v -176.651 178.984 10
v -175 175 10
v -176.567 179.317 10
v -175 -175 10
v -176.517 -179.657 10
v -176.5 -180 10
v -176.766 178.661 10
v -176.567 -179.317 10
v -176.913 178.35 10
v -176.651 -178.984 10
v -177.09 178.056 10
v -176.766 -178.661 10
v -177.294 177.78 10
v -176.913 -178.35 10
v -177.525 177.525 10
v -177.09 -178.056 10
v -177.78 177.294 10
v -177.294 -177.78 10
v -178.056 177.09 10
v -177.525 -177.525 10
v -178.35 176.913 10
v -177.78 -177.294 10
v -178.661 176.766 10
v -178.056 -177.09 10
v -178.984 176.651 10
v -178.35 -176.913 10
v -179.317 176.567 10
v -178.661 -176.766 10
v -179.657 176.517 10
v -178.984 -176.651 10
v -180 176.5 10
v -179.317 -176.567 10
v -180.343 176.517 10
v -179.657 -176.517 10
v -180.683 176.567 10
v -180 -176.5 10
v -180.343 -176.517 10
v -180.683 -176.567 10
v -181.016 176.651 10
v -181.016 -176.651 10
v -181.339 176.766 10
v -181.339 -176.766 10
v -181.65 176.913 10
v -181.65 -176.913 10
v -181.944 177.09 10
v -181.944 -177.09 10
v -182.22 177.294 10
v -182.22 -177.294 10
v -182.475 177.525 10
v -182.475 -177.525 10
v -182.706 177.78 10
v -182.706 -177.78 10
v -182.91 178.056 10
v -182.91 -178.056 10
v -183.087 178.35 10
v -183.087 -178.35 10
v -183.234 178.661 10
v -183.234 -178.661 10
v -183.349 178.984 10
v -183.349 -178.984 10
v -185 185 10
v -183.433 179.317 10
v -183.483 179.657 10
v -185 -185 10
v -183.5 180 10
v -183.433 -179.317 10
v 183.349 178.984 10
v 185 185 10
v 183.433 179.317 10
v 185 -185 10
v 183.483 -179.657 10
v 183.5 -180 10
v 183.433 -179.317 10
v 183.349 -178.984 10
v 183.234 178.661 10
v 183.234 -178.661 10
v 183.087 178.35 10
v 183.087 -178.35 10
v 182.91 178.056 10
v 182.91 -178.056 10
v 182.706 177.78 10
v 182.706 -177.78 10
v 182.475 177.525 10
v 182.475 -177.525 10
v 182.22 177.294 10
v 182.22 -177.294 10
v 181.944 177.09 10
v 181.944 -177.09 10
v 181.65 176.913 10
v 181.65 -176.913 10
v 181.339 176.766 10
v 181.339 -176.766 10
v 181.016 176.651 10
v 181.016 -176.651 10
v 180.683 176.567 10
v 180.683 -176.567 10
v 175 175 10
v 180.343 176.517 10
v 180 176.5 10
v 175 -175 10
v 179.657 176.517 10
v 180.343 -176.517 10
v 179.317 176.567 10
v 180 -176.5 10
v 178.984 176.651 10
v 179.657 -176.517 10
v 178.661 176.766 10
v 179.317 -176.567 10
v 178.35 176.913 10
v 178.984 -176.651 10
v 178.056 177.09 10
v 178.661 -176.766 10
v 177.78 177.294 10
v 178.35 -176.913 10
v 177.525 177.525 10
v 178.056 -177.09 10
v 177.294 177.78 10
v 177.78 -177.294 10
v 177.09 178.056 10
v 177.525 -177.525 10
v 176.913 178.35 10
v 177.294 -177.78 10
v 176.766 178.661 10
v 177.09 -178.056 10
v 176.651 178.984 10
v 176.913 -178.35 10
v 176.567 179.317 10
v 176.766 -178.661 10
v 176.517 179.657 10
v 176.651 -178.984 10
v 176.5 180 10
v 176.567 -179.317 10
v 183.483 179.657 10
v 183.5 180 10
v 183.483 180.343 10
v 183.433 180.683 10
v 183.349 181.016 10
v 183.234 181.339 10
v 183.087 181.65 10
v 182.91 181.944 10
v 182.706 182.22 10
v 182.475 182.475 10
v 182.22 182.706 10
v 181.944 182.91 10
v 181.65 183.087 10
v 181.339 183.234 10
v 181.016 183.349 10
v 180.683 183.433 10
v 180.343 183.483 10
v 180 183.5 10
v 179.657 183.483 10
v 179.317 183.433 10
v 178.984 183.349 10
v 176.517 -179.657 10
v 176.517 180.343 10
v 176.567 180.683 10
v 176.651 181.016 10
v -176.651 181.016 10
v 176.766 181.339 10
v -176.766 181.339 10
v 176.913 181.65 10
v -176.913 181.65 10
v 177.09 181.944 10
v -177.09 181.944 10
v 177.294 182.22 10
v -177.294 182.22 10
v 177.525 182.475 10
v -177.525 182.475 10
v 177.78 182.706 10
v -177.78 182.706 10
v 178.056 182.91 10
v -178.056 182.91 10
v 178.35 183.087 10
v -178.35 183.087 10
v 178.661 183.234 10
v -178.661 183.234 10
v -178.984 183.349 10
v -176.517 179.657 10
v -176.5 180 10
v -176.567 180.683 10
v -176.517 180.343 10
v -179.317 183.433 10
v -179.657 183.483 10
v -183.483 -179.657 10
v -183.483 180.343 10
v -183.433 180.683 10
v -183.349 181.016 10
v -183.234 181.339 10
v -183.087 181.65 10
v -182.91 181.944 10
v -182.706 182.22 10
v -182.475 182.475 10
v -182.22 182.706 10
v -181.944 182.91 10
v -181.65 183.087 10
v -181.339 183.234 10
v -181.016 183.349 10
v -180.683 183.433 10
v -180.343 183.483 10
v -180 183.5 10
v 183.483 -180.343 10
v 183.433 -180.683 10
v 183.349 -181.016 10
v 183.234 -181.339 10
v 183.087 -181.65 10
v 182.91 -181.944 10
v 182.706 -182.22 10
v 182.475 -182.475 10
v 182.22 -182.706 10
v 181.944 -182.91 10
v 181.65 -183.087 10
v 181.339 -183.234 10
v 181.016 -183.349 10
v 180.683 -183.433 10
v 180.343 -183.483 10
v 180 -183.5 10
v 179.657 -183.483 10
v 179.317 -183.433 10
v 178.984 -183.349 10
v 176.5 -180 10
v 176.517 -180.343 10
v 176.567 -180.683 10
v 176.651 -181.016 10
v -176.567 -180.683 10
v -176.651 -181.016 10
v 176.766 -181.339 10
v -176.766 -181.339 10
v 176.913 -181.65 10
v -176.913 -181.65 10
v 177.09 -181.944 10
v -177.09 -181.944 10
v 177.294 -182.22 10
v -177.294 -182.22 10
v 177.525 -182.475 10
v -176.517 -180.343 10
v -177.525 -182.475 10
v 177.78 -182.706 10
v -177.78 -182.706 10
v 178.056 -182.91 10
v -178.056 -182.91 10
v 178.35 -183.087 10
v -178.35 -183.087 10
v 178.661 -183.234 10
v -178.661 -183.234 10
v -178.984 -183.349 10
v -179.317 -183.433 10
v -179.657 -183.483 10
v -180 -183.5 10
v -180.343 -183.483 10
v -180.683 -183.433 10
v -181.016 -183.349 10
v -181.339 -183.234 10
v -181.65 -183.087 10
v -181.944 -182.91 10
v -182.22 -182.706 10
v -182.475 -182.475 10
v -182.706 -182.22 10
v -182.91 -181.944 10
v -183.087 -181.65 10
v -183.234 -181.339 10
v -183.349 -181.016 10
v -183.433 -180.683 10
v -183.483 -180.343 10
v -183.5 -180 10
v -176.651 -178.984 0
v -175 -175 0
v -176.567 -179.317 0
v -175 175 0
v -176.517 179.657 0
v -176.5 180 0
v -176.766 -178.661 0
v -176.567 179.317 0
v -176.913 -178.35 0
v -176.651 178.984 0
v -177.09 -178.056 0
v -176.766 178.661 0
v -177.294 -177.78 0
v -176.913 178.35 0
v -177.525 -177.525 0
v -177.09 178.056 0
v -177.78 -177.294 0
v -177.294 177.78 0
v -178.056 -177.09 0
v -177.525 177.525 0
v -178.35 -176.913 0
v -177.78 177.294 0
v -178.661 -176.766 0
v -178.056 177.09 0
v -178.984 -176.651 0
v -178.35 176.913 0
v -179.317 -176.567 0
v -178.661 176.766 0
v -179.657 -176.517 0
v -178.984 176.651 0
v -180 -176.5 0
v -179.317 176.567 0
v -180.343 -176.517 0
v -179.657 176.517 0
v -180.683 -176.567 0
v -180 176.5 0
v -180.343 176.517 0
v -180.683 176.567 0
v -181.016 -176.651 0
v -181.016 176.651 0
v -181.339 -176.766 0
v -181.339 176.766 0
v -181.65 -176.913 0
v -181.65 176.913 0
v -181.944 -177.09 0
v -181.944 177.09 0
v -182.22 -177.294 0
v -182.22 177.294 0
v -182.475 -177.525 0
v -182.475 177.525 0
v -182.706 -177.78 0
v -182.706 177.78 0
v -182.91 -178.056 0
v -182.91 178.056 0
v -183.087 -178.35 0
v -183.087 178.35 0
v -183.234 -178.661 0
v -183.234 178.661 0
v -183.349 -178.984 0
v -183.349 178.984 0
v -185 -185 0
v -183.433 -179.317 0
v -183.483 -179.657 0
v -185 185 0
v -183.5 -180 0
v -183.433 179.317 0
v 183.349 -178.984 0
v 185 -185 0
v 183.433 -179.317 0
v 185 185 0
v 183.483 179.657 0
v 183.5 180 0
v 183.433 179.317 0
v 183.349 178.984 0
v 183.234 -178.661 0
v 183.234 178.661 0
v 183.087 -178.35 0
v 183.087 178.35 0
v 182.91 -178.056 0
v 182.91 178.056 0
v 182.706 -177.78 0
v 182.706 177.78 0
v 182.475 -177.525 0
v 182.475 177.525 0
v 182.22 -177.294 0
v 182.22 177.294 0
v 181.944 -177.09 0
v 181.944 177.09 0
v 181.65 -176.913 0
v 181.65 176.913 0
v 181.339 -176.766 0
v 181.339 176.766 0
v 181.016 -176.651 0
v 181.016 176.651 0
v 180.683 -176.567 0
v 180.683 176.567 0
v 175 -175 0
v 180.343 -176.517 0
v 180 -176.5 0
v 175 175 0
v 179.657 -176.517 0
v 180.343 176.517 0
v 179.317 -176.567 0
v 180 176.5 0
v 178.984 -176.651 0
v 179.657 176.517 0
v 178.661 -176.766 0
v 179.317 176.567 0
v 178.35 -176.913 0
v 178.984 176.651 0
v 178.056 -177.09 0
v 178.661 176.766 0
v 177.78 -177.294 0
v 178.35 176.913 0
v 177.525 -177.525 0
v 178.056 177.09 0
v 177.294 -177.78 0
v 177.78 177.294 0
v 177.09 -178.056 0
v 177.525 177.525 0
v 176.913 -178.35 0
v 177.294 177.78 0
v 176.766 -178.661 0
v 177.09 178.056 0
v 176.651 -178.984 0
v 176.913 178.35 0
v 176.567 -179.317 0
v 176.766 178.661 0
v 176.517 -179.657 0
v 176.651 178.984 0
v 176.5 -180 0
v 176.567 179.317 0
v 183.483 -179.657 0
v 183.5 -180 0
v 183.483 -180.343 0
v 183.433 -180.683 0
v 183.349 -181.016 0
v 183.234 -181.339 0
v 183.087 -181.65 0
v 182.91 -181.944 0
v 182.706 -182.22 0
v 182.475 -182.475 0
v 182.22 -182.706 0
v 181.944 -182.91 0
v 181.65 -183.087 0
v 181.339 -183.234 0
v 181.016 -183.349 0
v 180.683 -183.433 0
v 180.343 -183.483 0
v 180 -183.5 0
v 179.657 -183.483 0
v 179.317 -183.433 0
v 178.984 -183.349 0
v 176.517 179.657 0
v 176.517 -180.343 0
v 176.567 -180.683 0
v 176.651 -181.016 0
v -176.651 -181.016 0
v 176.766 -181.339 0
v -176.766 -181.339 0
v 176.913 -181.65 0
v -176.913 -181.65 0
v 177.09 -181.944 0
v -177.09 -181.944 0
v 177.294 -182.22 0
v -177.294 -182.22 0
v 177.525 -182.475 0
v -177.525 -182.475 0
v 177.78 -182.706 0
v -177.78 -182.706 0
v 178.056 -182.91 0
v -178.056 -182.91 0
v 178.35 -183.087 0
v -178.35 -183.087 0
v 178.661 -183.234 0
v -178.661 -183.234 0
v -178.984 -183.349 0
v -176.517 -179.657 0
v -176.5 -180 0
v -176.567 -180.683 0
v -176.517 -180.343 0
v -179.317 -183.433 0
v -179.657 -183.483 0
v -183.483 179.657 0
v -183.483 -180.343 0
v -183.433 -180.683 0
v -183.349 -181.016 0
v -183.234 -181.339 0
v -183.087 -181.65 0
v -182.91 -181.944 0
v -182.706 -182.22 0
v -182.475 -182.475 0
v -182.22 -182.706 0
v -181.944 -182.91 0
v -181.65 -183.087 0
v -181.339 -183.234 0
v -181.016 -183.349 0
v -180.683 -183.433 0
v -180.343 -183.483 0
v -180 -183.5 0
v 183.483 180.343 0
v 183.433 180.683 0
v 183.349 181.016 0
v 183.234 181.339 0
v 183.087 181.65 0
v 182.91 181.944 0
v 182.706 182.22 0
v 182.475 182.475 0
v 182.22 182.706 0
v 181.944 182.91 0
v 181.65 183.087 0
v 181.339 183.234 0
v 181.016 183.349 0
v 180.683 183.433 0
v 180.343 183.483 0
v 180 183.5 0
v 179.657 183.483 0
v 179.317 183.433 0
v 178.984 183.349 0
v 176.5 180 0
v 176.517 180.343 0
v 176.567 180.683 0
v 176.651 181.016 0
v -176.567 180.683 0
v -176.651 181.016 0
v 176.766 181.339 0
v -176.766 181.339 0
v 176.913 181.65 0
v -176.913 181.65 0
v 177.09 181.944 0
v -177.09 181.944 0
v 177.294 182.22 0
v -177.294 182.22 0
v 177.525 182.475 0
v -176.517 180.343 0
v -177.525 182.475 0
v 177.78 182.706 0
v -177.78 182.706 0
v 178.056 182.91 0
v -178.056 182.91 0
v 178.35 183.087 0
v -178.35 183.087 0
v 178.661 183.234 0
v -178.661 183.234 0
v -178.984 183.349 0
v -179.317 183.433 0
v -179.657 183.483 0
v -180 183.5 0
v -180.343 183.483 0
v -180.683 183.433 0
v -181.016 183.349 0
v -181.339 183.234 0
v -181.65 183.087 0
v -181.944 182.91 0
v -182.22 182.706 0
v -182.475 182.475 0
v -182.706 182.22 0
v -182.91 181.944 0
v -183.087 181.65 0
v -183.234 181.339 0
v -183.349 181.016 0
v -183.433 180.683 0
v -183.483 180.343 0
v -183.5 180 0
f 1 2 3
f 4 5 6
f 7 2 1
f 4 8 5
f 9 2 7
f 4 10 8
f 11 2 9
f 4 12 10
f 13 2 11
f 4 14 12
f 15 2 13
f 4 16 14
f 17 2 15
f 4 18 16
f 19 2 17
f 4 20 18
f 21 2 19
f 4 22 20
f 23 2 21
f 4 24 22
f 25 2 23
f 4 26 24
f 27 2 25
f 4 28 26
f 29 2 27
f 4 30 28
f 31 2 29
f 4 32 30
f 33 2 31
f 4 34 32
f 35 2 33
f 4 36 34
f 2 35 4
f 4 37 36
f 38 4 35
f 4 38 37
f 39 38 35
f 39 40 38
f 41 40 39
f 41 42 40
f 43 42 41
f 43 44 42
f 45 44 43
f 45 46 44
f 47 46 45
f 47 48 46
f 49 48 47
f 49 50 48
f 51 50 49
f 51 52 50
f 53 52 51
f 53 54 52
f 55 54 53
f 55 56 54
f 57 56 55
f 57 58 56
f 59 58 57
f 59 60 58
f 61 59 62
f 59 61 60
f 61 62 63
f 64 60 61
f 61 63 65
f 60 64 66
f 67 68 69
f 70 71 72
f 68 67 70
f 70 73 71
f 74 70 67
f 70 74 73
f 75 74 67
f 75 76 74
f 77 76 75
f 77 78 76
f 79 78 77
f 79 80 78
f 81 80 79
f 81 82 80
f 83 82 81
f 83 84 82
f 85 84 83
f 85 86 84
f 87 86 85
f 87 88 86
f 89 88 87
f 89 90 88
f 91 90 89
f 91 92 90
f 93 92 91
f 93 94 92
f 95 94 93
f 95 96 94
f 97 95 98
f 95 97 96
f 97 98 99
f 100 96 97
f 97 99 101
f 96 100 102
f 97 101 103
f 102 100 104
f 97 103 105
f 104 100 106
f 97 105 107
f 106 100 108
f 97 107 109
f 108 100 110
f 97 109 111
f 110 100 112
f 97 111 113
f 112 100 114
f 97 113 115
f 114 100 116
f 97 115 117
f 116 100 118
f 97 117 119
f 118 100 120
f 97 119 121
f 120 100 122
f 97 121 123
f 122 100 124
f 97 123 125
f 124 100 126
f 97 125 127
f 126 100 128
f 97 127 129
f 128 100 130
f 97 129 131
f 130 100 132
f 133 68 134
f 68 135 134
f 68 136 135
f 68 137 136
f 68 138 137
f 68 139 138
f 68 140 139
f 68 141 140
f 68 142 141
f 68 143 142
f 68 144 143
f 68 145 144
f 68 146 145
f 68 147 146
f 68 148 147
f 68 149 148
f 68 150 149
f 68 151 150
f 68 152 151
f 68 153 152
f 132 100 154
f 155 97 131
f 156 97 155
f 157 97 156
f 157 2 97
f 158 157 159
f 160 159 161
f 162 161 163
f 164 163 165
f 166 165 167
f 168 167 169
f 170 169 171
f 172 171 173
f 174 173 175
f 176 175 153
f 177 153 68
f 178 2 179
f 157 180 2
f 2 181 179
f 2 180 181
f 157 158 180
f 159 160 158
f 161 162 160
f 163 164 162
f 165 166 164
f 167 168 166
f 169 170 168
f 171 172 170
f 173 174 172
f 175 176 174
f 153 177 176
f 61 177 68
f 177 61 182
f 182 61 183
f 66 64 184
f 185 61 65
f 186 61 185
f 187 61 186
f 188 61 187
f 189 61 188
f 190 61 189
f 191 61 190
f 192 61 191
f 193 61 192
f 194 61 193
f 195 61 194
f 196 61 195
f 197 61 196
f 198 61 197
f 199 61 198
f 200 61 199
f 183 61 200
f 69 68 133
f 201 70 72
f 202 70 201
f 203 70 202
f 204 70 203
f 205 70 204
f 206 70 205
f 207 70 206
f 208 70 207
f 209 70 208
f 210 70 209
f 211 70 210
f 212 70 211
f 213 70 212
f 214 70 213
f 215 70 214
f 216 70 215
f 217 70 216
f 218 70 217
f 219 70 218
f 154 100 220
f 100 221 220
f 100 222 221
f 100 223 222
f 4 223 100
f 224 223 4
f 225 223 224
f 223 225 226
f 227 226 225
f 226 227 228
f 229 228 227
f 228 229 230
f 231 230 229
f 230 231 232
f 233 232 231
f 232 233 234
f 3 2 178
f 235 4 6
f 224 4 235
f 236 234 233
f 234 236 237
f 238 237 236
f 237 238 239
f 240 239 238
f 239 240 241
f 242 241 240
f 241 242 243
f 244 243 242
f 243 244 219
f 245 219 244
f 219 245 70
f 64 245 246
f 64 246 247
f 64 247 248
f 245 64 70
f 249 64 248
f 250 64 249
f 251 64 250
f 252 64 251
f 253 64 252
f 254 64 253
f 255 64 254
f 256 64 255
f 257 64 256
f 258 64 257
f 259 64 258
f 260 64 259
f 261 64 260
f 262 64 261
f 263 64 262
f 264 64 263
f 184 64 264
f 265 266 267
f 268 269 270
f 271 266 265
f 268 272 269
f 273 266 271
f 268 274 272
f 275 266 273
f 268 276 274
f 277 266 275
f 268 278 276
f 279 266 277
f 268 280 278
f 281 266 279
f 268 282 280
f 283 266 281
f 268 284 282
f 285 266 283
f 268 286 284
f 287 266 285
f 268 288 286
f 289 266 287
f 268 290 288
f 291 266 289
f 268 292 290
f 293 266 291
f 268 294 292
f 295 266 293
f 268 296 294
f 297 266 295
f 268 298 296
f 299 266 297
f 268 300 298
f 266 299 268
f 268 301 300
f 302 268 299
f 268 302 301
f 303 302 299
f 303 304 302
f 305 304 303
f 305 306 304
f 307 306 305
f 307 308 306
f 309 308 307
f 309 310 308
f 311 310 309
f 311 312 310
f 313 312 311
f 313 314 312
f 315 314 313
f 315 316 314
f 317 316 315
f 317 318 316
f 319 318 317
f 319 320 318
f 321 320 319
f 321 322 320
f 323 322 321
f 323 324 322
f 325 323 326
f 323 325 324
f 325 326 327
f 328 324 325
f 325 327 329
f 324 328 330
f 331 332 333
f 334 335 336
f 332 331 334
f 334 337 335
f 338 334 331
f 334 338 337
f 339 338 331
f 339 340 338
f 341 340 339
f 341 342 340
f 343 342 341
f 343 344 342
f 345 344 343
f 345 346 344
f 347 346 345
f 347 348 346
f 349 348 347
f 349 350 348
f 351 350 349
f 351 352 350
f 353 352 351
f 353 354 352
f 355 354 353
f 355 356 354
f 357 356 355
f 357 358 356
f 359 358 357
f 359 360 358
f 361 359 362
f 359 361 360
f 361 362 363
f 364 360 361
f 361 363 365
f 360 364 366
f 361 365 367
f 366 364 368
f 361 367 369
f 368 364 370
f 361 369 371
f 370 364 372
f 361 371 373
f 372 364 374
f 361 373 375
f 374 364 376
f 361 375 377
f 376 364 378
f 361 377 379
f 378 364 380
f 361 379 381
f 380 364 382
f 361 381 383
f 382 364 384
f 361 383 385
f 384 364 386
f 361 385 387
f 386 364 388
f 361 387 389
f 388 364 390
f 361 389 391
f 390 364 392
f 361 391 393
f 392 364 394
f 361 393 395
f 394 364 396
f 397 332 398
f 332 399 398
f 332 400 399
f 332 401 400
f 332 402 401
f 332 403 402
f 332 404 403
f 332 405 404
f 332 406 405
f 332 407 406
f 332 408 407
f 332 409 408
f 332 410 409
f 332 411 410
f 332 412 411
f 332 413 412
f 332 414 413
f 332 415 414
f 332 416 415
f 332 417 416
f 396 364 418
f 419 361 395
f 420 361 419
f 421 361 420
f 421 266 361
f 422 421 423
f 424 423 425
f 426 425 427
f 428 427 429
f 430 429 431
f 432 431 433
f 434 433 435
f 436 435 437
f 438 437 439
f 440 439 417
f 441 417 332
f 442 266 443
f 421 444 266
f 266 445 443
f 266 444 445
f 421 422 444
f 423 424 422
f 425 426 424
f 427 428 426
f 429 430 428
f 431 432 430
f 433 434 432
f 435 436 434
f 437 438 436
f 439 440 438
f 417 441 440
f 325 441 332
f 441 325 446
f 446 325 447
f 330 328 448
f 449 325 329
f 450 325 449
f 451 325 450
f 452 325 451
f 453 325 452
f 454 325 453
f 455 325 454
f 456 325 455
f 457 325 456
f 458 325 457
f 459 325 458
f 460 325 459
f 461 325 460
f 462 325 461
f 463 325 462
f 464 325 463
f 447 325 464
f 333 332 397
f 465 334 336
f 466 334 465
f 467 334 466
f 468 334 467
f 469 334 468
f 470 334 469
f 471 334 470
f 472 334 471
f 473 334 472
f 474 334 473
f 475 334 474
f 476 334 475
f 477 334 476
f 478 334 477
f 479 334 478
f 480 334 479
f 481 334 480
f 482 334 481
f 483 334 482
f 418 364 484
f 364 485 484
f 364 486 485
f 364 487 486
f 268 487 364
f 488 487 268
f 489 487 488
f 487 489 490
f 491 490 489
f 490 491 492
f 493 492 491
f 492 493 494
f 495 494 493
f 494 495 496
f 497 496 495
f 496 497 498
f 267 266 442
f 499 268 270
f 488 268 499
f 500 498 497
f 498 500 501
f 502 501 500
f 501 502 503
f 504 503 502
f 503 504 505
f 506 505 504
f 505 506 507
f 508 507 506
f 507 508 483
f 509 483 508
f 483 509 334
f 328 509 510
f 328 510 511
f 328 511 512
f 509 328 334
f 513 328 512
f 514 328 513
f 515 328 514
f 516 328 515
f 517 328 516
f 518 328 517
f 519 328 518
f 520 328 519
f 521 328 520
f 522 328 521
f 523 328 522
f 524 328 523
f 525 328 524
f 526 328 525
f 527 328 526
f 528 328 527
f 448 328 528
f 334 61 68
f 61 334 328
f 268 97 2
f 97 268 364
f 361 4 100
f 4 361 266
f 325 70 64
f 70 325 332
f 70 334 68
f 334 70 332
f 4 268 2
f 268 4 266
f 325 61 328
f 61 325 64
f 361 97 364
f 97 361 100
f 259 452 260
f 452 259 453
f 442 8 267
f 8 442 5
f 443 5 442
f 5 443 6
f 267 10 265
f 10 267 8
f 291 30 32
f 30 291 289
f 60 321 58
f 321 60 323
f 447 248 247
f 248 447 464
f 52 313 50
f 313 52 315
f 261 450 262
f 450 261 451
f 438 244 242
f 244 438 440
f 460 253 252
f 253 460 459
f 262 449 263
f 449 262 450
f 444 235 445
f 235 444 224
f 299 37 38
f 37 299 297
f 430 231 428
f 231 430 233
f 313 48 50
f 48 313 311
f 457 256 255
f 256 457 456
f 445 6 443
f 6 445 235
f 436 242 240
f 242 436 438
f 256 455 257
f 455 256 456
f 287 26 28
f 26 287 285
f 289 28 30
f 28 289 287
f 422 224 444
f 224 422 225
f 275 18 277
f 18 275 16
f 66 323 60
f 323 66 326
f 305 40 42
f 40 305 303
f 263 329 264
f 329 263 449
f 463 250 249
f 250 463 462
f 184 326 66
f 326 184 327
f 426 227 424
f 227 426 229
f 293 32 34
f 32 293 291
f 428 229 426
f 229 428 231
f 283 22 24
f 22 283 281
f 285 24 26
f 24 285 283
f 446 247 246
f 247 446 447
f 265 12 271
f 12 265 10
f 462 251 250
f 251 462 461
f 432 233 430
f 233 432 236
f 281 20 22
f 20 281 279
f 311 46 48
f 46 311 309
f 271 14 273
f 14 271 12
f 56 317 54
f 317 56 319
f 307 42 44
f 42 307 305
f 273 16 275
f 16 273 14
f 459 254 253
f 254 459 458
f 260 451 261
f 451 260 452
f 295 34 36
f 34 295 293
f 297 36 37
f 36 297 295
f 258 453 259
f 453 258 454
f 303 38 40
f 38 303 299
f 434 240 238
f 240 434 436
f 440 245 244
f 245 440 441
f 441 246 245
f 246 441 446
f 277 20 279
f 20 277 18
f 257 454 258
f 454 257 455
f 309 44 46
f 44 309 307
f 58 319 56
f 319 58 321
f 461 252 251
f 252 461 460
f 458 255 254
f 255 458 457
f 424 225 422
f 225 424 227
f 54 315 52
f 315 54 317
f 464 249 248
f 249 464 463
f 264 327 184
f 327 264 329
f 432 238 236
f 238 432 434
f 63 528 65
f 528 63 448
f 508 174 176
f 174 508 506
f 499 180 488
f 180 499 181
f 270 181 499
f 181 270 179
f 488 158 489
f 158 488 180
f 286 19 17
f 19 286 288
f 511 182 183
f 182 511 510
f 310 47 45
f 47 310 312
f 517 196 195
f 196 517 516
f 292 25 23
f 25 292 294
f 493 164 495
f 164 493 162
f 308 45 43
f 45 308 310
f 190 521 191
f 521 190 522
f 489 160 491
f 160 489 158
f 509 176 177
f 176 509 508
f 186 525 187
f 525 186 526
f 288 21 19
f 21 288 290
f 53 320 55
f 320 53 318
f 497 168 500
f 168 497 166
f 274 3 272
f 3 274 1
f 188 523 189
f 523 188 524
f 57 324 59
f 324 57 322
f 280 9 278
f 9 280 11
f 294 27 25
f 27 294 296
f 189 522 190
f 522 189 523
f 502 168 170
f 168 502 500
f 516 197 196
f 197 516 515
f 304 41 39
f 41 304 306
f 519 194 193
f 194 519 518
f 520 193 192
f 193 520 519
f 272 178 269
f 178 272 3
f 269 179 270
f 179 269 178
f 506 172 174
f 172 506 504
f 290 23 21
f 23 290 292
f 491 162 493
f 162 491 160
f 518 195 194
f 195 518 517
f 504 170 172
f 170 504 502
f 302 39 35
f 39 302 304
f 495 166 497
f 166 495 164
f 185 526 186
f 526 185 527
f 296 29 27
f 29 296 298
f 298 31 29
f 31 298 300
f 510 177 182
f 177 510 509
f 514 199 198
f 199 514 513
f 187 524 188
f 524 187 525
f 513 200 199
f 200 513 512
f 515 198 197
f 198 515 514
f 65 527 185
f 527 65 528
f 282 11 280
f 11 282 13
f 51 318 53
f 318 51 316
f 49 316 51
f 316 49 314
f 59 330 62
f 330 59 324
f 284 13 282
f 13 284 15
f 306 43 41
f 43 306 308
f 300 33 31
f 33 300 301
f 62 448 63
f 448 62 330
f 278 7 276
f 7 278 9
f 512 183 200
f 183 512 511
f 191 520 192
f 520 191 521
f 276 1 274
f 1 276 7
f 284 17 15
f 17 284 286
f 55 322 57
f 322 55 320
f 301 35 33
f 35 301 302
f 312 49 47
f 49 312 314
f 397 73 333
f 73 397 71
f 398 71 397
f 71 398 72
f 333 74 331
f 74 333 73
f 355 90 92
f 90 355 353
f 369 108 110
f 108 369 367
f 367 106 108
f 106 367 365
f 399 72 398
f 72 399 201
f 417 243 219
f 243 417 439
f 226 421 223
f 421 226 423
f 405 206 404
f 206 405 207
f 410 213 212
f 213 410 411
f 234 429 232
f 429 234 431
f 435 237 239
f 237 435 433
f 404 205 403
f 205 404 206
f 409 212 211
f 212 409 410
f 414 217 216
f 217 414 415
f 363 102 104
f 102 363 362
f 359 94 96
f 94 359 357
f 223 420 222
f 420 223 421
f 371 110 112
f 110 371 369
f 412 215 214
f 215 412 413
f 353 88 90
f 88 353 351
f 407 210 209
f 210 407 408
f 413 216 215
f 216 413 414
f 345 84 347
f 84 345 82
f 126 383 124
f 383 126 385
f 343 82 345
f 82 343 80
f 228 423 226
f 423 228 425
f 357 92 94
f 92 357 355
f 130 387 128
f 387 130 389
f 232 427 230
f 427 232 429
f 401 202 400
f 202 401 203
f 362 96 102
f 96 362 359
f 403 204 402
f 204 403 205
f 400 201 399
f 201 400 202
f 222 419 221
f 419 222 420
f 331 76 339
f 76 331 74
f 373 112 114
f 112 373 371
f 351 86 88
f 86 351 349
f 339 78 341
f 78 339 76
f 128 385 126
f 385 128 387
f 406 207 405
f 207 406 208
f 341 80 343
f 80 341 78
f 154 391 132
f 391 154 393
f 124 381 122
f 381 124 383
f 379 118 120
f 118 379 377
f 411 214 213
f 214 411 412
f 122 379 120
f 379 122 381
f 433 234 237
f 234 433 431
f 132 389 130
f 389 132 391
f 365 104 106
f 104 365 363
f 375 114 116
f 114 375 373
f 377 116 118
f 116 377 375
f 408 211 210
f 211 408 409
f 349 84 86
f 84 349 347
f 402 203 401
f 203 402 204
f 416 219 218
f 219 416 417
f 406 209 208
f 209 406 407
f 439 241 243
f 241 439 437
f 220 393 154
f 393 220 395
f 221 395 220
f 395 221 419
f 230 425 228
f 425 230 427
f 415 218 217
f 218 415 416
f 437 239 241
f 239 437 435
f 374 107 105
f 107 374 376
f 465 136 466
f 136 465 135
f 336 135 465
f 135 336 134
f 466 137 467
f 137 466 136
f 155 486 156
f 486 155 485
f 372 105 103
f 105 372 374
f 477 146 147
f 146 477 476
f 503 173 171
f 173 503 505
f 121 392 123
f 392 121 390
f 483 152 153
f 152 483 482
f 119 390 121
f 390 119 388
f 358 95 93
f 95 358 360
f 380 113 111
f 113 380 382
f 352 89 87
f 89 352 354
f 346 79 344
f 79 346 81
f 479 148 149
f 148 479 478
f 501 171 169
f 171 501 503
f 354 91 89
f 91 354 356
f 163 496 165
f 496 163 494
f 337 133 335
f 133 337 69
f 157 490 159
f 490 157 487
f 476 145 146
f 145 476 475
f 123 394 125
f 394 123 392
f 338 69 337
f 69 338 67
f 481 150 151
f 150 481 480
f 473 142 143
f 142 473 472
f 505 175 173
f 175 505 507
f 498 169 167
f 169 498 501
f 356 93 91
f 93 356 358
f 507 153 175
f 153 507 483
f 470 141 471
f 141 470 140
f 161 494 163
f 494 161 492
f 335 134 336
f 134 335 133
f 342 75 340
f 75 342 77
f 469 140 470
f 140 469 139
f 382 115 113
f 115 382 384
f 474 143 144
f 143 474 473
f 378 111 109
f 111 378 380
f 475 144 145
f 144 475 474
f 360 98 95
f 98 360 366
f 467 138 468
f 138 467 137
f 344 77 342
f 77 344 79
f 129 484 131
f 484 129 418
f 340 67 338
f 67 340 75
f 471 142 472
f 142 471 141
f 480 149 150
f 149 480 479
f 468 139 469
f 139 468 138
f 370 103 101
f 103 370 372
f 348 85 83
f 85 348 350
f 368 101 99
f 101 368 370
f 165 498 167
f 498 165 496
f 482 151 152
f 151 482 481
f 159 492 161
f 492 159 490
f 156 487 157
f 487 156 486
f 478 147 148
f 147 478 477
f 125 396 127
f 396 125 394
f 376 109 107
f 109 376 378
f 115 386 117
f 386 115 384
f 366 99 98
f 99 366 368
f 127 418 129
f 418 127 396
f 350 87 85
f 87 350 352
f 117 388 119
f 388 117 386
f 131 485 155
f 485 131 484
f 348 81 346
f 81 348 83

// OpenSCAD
// ring_71.scad - ring index 71 (z bottom = 710 mm) (topmost)
$fn = 64; bar = 10; half_b = bar/2; outer = 370; half_outer = outer/2;
front_y = 180; back_y = -180; left_x = -180; right_x = 180;
x_centers = [-170, -100, -30, 40, 110, 180];
z_centers = [5, 85, 155, 225, 295, 365, 435, 505, 575, 645, 715]; ring_z = 710;
module place_box(cx, cy, sx, sy) { translate([cx - sx/2, cy - sy/2, 0]) cube([sx, sy, bar]); }

difference() { union() {
    for (x = x_centers) { place_box(x, front_y, bar, bar); place_box(x, back_y, bar, bar); }
    for (y = x_centers) { place_box(left_x, y, bar, bar); place_box(right_x, y, bar, bar); }
    for (zc = z_centers) if ((zc - half_b < ring_z + bar) && (zc + half_b > ring_z)) {
        translate([-half_outer, front_y - half_b, 0]) cube([outer, bar, bar]);
        translate([-half_outer, back_y - half_b, 0])  cube([outer, bar, bar]);
        translate([left_x - half_b, -half_outer, 0])  cube([bar, outer, bar]);
        translate([right_x - half_b, -half_outer, 0]) cube([bar, outer, bar]);
    }
  }
  for (cx = [-180, 180]) for (cy = [-180, 180]) translate([cx, cy, 0]) cylinder(h = bar, r = 3.5, $fn = 64);
}
